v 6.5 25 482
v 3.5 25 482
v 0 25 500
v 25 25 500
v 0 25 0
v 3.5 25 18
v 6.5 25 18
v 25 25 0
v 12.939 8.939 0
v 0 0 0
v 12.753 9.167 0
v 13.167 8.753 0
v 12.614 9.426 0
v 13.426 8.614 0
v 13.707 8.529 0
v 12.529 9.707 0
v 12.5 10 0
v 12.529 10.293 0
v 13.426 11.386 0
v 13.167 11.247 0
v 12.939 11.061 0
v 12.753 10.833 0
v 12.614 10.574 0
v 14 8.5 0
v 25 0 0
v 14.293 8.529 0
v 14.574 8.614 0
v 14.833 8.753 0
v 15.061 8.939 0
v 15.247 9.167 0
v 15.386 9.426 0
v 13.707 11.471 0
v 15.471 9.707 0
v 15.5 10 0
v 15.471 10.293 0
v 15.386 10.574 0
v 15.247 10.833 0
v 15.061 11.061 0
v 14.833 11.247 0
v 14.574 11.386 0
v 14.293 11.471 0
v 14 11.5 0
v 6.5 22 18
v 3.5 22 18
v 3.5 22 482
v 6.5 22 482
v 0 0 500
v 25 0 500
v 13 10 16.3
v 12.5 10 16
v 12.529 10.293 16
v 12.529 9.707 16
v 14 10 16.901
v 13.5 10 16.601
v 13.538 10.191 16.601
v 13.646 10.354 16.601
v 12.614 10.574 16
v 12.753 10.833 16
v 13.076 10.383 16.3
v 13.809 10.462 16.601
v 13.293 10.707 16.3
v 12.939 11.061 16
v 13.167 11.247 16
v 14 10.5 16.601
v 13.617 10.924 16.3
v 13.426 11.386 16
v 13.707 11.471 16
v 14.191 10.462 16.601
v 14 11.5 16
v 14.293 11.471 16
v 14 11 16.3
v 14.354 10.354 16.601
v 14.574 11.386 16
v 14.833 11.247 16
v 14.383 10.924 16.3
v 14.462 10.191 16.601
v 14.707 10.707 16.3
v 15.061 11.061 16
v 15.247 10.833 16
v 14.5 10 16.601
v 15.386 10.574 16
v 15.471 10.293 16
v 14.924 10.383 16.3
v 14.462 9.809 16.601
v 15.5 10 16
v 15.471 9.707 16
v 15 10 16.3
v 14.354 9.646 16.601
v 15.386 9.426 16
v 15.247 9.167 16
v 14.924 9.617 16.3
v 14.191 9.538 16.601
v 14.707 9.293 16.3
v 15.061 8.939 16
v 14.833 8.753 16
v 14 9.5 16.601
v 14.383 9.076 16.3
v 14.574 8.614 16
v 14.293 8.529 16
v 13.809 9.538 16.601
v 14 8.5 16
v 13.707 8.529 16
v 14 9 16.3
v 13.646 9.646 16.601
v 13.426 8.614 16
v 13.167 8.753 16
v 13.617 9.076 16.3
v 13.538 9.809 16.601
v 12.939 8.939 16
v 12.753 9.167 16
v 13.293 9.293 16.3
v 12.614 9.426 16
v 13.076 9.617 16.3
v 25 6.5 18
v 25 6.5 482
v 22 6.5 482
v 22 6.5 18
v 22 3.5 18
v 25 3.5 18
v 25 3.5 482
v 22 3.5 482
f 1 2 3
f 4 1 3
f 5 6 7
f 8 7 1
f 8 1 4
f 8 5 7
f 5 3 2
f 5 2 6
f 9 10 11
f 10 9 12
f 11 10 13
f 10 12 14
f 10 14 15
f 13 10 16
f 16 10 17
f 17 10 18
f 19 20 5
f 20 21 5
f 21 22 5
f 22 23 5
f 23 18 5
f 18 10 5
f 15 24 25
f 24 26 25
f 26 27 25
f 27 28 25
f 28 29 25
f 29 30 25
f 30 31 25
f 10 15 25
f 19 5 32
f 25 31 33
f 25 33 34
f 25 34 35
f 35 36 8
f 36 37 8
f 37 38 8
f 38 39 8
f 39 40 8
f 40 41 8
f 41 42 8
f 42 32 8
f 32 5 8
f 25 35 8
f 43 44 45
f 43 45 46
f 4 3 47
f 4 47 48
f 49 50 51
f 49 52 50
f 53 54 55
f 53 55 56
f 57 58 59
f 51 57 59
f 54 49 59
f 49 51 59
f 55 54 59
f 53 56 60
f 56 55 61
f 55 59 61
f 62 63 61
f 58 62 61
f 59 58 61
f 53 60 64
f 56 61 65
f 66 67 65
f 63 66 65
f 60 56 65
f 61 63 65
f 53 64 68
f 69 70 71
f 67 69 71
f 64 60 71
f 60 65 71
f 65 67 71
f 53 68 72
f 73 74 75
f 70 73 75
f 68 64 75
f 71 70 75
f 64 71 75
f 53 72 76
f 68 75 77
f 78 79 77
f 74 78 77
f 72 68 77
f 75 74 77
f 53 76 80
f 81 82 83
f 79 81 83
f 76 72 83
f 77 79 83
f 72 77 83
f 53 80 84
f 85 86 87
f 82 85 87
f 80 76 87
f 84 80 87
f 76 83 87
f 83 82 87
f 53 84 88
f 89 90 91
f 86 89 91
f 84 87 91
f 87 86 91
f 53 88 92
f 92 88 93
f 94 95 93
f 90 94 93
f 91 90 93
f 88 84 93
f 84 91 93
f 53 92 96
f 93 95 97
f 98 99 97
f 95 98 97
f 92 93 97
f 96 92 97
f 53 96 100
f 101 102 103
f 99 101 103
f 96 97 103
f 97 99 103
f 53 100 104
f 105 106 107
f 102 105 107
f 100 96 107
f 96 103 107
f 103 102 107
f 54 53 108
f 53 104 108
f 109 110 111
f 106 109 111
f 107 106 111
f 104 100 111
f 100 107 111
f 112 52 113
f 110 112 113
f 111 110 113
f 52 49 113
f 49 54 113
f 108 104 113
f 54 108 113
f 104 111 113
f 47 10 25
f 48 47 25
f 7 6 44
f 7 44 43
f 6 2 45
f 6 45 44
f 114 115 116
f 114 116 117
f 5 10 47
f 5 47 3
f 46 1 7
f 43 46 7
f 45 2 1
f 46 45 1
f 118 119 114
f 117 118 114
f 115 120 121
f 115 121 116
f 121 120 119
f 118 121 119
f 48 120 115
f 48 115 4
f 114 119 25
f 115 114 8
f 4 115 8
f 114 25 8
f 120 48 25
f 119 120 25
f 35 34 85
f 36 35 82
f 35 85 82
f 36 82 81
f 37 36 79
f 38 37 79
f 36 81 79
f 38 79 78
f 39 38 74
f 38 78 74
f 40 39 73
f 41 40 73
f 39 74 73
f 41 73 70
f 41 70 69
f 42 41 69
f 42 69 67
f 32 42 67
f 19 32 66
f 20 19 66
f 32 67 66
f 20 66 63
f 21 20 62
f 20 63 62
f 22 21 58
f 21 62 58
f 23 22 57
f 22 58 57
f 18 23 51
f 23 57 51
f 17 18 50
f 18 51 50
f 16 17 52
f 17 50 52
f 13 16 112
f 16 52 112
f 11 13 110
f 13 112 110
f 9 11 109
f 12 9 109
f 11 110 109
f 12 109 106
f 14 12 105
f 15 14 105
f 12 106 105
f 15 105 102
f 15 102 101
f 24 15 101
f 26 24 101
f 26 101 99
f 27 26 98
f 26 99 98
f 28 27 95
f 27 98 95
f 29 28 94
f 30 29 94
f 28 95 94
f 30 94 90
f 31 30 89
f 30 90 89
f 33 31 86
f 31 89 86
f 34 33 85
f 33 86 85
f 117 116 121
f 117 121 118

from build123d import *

# Parameters (mm, degrees)
SZKIC1_W                       = 25
SZKIC1_H                       = 25
DODANIE_WYCI_GNI_CIE1_DEPTH    = 500
SZKIC2_W                       = 3
SZKIC2_H                       = 464
WYTNIJ_WYCI_GNI_CIE1_DEPTH     = 3
SZKIC3_W                       = 464
SZKIC3_H                       = 3
WYTNIJ_WYCI_GNI_CIE2_DEPTH     = 3
OTWORY_USTALAJ_CE_3_0MM1_D     = 3
OTWORY_USTALAJ_CE_3_0MM1_DEPTH = 16
OTWORY_USTALAJ_CE_3_0MM1_TIP   = 0.901290929


with BuildPart() as part:
    # Szkic1 → Dodanie-wyciągnięcie1 (new body)
    with BuildSketch(Plane.XY):
        with Locations((12.5, 12.5)):
            Rectangle(SZKIC1_W, SZKIC1_H)
    extrude(amount=DODANIE_WYCI_GNI_CIE1_DEPTH)

    # Szkic2 → Wytnij-wyciągnięcie1 (cut)
    with BuildSketch(Plane(origin=(0, 25, 0), x_dir=(1, 0, 0), z_dir=(0, 1, 0))):
        with Locations((5, -250)):
            Rectangle(SZKIC2_W, SZKIC2_H)
    extrude(amount=-WYTNIJ_WYCI_GNI_CIE1_DEPTH, mode=Mode.SUBTRACT)

    # Szkic3 → Wytnij-wyciągnięcie2 (cut)
    with BuildSketch(Plane(origin=(25, 0, 0), x_dir=(0, 0, -1), z_dir=(1, 0, 0))):
        with Locations((-250, 5)):
            Rectangle(SZKIC3_W, SZKIC3_H)
    extrude(amount=-WYTNIJ_WYCI_GNI_CIE2_DEPTH, mode=Mode.SUBTRACT)

    # Otwory ustalające Ø3.0mm1
    with Locations(Plane(origin=(0, 0, 0), x_dir=(-1, 0, 0), z_dir=(0, 0, -1))):
        with Locations((-14, 10)):
            Hole(OTWORY_USTALAJ_CE_3_0MM1_D / 2, depth=OTWORY_USTALAJ_CE_3_0MM1_DEPTH)
            with Locations((0, 0, -(OTWORY_USTALAJ_CE_3_0MM1_DEPTH + OTWORY_USTALAJ_CE_3_0MM1_TIP / 2))):  # 118° drill point
                Cone(0, OTWORY_USTALAJ_CE_3_0MM1_D / 2, OTWORY_USTALAJ_CE_3_0MM1_TIP, mode=Mode.SUBTRACT)


solid = part.part
